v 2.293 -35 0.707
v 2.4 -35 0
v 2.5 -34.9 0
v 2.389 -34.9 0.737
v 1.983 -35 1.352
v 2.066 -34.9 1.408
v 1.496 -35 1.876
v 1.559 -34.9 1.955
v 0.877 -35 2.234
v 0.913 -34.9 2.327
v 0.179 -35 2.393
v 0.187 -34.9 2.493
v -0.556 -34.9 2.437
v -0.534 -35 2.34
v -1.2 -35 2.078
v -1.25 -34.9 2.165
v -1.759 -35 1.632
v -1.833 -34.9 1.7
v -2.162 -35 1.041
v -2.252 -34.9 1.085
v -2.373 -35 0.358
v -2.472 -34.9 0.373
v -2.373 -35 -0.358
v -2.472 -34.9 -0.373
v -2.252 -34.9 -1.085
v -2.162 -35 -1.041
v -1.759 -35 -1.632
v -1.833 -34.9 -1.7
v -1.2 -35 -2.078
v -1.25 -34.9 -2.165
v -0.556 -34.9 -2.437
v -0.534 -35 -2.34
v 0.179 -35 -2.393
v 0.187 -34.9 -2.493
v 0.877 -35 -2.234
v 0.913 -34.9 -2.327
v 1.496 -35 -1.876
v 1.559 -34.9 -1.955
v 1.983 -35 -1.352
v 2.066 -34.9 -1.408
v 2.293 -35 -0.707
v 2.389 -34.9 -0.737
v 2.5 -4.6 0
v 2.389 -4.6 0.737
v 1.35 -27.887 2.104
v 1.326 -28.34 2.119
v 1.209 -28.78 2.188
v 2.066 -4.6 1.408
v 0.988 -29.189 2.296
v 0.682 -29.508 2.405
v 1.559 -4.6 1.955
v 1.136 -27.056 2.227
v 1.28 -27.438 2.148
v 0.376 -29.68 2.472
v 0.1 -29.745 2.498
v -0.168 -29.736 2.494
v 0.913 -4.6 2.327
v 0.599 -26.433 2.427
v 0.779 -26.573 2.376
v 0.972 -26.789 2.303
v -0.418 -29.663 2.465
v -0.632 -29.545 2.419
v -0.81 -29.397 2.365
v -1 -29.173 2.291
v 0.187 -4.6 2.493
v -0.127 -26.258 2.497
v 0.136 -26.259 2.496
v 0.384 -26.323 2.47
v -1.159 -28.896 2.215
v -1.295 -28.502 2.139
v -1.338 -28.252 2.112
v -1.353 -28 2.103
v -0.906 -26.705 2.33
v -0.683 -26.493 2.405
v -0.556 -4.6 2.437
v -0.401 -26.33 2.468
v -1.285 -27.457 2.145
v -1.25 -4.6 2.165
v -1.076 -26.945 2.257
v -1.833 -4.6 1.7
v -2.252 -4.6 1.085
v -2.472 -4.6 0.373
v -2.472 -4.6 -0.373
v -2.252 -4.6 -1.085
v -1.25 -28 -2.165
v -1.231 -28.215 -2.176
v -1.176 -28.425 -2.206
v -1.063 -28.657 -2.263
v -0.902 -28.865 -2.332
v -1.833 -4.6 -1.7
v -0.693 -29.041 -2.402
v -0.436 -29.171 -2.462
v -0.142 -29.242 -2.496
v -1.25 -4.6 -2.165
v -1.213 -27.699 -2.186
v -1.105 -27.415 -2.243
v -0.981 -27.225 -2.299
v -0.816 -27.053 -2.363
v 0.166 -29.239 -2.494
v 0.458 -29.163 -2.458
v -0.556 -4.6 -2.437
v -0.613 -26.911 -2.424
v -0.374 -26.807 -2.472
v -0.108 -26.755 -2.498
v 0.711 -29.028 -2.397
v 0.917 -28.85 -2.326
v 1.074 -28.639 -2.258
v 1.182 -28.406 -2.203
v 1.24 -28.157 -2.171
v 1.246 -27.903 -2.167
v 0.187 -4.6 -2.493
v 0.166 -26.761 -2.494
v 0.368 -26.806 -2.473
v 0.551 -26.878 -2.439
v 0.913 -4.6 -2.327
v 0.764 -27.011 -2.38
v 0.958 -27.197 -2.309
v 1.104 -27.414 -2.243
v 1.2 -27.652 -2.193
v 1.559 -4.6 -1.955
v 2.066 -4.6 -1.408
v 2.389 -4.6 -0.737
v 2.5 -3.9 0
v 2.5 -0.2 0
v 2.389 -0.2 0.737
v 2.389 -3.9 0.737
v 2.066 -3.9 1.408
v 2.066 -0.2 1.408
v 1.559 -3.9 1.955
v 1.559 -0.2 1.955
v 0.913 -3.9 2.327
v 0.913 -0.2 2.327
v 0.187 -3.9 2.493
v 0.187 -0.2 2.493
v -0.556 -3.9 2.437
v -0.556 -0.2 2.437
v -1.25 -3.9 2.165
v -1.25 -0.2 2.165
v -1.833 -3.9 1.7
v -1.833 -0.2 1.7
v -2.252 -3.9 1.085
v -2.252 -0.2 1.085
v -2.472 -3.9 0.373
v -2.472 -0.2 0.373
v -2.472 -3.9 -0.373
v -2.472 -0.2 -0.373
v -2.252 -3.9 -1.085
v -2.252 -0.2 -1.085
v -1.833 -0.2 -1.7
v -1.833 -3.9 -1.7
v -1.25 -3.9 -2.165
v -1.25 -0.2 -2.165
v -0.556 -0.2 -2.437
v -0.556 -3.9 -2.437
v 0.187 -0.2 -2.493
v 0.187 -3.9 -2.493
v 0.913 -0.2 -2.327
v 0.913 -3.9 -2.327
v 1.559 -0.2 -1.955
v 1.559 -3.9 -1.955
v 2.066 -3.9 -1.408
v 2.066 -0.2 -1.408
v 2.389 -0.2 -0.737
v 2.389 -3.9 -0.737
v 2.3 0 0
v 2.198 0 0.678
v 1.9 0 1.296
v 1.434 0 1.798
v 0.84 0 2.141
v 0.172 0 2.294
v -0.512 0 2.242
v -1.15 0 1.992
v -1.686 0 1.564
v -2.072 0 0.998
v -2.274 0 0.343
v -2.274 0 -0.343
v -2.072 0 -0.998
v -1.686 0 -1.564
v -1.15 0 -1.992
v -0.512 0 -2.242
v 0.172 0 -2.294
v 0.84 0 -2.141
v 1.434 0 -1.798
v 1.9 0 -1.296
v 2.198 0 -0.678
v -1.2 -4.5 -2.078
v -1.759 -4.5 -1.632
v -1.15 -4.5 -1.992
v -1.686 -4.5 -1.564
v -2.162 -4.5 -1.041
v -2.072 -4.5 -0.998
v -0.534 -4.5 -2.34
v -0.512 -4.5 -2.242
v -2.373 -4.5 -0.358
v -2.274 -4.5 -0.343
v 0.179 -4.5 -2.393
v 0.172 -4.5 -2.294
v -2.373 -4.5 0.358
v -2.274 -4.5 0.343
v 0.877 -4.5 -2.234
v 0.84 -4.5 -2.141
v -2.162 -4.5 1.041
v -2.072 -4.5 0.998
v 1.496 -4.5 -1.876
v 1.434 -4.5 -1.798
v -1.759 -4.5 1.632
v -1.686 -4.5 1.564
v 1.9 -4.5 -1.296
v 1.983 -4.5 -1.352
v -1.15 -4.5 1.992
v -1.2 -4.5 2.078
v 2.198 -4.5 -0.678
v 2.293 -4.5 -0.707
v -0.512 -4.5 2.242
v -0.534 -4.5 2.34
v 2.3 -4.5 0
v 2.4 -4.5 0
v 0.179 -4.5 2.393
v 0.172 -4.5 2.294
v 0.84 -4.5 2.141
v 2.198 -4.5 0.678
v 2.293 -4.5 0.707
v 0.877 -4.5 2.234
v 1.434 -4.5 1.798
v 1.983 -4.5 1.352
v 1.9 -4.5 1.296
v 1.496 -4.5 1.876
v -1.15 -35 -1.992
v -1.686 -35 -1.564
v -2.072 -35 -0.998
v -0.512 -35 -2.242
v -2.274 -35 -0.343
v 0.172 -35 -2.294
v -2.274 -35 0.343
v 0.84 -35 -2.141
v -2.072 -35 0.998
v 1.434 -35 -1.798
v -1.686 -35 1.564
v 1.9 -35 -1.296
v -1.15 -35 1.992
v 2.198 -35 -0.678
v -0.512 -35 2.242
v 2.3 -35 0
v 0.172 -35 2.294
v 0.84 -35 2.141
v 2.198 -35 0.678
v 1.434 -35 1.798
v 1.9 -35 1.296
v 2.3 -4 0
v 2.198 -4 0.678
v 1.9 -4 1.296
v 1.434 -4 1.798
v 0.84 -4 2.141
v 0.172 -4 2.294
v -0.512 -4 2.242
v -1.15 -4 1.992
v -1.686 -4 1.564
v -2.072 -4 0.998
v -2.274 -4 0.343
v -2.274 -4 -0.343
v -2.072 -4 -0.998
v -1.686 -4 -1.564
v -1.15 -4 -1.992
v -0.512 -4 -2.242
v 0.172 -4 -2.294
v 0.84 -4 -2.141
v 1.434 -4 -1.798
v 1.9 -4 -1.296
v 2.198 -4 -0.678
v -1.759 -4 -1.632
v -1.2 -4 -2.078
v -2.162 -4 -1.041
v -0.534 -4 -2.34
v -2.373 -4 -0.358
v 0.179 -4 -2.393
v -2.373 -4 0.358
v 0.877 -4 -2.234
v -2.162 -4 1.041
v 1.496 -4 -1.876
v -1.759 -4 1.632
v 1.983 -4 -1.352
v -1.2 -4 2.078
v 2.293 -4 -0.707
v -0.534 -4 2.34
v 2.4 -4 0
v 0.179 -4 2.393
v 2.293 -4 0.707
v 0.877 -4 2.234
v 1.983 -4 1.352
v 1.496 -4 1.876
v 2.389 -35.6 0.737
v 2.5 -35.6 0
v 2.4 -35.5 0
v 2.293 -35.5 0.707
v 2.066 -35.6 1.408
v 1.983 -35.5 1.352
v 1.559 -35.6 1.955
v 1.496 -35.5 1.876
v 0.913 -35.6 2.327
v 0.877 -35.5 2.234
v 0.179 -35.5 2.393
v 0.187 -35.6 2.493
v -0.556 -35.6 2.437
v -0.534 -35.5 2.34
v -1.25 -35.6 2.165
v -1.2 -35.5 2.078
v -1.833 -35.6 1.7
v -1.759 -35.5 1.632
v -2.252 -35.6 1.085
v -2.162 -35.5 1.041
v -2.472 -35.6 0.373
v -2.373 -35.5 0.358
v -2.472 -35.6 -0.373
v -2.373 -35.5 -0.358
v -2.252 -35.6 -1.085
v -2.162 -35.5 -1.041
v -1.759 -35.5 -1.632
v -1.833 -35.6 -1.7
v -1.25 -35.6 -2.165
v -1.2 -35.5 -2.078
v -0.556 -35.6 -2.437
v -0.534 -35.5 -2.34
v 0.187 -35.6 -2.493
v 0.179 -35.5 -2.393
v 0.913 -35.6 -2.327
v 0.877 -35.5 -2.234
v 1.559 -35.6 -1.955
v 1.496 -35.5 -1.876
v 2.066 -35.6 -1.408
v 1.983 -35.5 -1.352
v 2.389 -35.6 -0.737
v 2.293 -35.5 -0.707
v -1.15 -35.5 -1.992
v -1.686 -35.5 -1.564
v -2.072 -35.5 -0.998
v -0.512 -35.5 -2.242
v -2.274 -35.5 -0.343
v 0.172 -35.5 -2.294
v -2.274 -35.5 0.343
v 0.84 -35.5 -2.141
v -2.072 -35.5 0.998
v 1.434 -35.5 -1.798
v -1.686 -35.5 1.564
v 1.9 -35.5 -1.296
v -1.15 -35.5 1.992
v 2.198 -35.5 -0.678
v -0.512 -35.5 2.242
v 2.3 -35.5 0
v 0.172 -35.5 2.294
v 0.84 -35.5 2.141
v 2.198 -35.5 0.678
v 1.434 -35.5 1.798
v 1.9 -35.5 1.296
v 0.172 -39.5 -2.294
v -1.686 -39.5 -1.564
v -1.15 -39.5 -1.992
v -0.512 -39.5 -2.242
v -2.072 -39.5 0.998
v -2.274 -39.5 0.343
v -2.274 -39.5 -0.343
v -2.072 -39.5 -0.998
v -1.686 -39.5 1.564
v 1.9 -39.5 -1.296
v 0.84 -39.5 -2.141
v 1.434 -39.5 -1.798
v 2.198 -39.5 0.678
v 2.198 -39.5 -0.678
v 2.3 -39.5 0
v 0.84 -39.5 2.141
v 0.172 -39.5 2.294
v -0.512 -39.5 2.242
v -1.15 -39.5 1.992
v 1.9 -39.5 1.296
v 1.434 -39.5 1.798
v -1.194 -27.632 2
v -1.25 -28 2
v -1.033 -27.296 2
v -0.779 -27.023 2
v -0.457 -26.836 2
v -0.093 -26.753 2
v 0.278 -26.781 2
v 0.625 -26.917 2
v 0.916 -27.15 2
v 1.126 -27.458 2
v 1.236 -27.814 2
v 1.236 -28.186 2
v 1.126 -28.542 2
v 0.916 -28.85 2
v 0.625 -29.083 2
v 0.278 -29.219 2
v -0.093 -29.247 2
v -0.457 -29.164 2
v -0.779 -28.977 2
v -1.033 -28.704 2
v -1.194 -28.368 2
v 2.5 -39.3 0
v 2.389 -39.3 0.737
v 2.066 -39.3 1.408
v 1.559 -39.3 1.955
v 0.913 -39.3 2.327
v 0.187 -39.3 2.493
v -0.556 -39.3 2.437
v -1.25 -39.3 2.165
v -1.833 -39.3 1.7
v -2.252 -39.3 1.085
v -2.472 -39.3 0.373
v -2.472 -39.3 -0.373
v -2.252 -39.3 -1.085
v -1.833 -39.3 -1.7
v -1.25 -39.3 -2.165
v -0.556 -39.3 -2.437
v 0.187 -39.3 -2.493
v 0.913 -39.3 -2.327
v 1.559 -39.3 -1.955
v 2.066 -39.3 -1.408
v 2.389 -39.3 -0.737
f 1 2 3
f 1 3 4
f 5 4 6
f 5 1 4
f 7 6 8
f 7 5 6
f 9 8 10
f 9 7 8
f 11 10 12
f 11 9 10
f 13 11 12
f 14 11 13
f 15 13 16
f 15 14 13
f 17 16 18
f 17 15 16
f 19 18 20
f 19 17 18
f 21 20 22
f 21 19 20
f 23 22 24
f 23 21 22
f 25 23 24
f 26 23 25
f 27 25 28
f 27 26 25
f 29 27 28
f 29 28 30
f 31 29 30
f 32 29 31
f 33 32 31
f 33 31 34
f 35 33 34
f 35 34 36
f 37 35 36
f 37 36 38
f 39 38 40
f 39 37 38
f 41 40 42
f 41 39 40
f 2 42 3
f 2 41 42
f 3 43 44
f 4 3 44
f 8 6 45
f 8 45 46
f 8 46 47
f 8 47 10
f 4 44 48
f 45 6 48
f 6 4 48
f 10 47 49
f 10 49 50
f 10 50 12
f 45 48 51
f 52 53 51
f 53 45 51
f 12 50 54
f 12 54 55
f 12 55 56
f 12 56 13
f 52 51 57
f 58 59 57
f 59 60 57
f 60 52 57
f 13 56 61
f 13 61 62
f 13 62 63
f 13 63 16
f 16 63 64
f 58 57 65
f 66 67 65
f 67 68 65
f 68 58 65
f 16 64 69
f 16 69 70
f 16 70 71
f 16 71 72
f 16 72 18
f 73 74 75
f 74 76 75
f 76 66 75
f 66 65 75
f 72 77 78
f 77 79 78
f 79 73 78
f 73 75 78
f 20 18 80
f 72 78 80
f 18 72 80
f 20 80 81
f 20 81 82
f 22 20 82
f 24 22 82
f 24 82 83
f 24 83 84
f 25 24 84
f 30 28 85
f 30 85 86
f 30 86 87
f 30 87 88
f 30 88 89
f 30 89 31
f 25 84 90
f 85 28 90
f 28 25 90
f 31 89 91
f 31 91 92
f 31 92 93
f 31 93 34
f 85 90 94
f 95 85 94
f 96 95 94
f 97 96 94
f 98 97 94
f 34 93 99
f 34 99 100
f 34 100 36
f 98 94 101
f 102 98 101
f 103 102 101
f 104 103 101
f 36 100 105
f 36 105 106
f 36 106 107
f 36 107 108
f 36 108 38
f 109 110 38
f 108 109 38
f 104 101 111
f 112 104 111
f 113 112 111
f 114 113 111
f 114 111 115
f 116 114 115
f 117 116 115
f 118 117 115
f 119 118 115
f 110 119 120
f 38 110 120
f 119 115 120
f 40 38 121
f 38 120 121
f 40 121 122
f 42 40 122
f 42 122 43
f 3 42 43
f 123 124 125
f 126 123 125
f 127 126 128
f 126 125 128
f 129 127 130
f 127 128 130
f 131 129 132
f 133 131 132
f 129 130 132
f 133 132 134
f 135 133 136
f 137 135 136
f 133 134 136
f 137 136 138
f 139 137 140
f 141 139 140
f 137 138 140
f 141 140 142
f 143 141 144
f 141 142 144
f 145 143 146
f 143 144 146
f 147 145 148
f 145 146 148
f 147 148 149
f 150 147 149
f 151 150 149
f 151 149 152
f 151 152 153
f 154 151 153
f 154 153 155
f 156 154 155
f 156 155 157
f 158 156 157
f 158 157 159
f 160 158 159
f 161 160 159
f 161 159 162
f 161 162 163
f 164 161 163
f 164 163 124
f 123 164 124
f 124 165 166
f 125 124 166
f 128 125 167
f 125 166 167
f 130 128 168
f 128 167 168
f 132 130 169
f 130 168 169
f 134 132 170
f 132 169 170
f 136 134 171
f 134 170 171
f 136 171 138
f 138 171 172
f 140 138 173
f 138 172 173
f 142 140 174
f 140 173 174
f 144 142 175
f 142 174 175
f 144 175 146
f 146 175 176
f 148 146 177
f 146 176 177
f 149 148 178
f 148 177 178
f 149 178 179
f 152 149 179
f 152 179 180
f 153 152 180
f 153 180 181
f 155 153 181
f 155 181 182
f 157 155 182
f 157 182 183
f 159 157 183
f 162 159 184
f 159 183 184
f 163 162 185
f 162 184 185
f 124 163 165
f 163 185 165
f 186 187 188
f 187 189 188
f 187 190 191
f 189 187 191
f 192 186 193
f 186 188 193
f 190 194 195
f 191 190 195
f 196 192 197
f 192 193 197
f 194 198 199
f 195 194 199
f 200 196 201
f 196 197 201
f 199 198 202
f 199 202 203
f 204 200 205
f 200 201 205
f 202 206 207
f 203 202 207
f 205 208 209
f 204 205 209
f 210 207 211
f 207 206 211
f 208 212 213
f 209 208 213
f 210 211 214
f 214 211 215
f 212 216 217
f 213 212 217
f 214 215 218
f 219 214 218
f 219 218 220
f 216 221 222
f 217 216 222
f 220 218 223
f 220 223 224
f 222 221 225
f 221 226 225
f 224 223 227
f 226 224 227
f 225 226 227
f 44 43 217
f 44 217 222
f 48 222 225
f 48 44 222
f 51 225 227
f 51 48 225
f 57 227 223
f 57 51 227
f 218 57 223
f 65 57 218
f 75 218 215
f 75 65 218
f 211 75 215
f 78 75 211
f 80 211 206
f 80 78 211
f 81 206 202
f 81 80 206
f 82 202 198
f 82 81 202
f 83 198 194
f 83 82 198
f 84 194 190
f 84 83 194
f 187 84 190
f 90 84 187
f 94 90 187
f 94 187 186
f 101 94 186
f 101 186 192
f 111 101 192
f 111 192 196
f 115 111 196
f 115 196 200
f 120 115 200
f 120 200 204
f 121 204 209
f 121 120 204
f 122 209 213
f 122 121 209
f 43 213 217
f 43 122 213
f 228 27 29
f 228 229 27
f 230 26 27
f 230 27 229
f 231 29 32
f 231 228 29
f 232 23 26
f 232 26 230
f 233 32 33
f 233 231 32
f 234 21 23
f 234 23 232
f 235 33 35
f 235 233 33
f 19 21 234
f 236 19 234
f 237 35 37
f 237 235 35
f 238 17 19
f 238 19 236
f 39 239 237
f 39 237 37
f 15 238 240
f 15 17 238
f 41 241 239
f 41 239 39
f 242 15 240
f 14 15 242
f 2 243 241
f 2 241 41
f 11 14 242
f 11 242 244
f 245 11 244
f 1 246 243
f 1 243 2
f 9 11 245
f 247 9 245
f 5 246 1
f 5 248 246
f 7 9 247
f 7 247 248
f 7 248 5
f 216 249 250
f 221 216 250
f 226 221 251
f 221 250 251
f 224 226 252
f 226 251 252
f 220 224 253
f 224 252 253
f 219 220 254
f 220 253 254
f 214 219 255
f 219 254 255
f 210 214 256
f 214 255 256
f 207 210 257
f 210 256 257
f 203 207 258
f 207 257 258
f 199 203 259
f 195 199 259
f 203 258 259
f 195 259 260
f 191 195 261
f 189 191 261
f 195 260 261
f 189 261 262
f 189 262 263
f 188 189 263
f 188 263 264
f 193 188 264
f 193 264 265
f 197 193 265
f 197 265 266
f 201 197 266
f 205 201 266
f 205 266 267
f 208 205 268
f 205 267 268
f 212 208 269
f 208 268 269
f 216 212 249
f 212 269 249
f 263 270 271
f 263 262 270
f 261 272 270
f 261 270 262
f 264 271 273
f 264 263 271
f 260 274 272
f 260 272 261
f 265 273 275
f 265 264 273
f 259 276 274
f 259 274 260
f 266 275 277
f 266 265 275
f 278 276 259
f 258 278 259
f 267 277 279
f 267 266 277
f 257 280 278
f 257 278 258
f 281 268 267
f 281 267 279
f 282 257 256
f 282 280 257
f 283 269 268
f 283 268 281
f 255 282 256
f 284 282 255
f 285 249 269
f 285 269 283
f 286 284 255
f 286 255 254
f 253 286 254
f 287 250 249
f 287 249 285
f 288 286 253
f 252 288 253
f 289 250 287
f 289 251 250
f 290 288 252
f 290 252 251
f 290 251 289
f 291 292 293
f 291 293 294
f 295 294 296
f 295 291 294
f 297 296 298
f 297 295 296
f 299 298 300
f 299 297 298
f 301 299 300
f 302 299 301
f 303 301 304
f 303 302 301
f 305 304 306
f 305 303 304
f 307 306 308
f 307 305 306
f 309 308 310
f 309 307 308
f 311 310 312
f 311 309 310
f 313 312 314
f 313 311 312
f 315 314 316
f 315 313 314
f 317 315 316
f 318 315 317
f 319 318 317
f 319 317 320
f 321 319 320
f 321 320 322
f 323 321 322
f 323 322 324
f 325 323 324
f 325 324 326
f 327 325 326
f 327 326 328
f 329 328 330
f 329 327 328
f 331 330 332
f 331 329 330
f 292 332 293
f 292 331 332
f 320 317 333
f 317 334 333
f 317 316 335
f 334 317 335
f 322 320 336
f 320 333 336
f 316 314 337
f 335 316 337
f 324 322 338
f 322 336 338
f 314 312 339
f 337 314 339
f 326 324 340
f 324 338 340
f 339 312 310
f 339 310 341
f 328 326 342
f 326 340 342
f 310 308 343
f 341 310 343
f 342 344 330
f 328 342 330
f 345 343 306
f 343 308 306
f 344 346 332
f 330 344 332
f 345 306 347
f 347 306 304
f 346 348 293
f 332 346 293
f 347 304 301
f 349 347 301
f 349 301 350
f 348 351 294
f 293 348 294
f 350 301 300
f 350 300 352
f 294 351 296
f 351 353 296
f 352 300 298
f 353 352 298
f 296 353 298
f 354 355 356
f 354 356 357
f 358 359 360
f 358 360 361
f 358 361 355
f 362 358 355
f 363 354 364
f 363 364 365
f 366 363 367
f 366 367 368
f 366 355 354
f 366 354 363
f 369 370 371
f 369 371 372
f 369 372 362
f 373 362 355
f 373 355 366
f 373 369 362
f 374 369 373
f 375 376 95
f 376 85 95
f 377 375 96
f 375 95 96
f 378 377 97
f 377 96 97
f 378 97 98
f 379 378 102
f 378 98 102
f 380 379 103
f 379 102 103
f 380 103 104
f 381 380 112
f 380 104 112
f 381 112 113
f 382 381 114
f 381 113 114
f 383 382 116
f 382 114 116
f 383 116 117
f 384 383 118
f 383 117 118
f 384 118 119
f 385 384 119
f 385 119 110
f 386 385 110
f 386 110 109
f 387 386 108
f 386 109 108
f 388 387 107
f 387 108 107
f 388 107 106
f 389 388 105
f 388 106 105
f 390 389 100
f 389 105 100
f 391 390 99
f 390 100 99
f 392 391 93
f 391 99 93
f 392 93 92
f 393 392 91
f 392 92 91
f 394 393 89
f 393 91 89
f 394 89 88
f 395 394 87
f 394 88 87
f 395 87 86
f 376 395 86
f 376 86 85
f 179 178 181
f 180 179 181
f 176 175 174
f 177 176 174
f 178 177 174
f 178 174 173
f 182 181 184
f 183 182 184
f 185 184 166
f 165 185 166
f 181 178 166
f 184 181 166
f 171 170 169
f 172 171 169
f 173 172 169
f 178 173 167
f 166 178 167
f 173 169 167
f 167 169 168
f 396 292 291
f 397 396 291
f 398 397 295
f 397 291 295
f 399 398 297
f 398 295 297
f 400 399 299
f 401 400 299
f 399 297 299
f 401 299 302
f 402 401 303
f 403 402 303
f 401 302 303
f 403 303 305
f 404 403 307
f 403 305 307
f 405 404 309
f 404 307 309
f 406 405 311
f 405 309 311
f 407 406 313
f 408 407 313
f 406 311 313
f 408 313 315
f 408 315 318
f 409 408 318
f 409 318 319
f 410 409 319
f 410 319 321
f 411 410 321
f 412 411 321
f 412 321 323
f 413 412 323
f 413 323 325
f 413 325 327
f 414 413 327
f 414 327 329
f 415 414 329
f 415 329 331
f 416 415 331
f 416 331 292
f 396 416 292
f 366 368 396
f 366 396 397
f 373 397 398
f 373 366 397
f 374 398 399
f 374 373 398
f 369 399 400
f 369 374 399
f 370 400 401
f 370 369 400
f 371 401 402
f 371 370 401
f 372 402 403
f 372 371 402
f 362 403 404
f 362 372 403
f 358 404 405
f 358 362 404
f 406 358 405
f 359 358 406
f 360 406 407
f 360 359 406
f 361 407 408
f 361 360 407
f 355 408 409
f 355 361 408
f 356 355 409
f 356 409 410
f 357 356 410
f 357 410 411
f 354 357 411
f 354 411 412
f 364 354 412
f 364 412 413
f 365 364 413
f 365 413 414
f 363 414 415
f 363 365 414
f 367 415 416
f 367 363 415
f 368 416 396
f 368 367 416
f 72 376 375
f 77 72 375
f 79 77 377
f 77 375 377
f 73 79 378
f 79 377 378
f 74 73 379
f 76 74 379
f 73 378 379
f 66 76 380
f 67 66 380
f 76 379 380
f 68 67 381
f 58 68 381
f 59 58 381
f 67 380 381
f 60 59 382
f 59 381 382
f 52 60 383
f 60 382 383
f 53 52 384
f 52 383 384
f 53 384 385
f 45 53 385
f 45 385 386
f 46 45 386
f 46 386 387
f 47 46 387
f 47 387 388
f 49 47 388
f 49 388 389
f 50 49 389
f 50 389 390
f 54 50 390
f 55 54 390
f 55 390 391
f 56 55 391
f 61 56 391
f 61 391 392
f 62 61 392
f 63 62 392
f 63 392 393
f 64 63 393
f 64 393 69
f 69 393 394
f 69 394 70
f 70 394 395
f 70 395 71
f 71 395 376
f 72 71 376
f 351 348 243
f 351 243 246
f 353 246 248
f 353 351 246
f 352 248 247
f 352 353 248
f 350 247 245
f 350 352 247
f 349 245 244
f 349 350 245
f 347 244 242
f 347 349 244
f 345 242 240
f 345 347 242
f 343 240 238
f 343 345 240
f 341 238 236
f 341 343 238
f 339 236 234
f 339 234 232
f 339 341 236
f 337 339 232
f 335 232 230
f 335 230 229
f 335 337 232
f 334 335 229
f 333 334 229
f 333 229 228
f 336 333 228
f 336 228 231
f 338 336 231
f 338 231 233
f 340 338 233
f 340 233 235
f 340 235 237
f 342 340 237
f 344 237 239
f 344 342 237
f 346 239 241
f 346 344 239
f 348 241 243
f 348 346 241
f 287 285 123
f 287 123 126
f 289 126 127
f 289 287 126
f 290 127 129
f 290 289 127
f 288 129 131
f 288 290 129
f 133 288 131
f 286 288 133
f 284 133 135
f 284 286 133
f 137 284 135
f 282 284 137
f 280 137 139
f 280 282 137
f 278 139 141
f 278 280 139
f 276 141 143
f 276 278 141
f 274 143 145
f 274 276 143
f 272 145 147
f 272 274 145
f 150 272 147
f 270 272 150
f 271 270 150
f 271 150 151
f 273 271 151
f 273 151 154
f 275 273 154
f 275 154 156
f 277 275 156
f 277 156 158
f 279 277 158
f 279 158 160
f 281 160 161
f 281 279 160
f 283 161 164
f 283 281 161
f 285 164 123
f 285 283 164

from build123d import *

# Parameters (mm, degrees)
F0_R           = 2.5
F0_R_2         = 2.3
F1_DEPTH       = 39.5
F4_D           = 2.5
F4_CSINK_D     = 4.5
F4_CSINK_ANGLE = 90
F5_START       = 4
F5_DEPTH       = 0.5
F7_START       = -4
F6_R           = 2.5
F6_R_2         = 2.3
F7_DEPTH       = 0.5
F8_SIZE        = 0.2
F9_SIZE        = 0.1


with BuildPart() as f1:
    # F0 (on Front) → F1 (new body)
    with BuildSketch(Plane.XZ):
        Circle(F0_R)
        Circle(F0_R_2, mode=Mode.SUBTRACT)
        Circle(F0_R_2)
    extrude(amount=F1_DEPTH)

    # F4 (through all)
    with Locations(Plane.XY.offset(3)):
        with Locations((0, -28)):
            CounterSinkHole(F4_D / 2, F4_CSINK_D / 2, counter_sink_angle=F4_CSINK_ANGLE)

    # F0 (on Front) → F5 (cut)
    with BuildSketch(Plane.XZ.offset(F5_START)):
        Circle(F0_R)
        Circle(F0_R_2, mode=Mode.SUBTRACT)
    extrude(amount=F5_DEPTH, mode=Mode.SUBTRACT)

    # F6 (on face) → F7 (cut)
    with BuildSketch(Plane.XZ.offset(39.5).offset(F7_START)):
        Circle(F6_R)
        Circle(F6_R_2, mode=Mode.SUBTRACT)
    extrude(amount=-F7_DEPTH, mode=Mode.SUBTRACT)

    # F8
    f8_edges = [f1.edges().sort_by_distance(p)[0] for p in [
        (-2.5, -39.5, 0),
        (-2.5, 0, 0),
    ]]
    chamfer(f8_edges, length=F8_SIZE)

    # F9
    f9_edges = [f1.edges().sort_by_distance(p)[0] for p in [
        (-2.5, -4, 0),
        (-2.5, -4.5, 0),
        (-2.5, -35, 0),
        (-2.5, -35.5, 0),
    ]]
    chamfer(f9_edges, length=F9_SIZE)


solid = f1.part
